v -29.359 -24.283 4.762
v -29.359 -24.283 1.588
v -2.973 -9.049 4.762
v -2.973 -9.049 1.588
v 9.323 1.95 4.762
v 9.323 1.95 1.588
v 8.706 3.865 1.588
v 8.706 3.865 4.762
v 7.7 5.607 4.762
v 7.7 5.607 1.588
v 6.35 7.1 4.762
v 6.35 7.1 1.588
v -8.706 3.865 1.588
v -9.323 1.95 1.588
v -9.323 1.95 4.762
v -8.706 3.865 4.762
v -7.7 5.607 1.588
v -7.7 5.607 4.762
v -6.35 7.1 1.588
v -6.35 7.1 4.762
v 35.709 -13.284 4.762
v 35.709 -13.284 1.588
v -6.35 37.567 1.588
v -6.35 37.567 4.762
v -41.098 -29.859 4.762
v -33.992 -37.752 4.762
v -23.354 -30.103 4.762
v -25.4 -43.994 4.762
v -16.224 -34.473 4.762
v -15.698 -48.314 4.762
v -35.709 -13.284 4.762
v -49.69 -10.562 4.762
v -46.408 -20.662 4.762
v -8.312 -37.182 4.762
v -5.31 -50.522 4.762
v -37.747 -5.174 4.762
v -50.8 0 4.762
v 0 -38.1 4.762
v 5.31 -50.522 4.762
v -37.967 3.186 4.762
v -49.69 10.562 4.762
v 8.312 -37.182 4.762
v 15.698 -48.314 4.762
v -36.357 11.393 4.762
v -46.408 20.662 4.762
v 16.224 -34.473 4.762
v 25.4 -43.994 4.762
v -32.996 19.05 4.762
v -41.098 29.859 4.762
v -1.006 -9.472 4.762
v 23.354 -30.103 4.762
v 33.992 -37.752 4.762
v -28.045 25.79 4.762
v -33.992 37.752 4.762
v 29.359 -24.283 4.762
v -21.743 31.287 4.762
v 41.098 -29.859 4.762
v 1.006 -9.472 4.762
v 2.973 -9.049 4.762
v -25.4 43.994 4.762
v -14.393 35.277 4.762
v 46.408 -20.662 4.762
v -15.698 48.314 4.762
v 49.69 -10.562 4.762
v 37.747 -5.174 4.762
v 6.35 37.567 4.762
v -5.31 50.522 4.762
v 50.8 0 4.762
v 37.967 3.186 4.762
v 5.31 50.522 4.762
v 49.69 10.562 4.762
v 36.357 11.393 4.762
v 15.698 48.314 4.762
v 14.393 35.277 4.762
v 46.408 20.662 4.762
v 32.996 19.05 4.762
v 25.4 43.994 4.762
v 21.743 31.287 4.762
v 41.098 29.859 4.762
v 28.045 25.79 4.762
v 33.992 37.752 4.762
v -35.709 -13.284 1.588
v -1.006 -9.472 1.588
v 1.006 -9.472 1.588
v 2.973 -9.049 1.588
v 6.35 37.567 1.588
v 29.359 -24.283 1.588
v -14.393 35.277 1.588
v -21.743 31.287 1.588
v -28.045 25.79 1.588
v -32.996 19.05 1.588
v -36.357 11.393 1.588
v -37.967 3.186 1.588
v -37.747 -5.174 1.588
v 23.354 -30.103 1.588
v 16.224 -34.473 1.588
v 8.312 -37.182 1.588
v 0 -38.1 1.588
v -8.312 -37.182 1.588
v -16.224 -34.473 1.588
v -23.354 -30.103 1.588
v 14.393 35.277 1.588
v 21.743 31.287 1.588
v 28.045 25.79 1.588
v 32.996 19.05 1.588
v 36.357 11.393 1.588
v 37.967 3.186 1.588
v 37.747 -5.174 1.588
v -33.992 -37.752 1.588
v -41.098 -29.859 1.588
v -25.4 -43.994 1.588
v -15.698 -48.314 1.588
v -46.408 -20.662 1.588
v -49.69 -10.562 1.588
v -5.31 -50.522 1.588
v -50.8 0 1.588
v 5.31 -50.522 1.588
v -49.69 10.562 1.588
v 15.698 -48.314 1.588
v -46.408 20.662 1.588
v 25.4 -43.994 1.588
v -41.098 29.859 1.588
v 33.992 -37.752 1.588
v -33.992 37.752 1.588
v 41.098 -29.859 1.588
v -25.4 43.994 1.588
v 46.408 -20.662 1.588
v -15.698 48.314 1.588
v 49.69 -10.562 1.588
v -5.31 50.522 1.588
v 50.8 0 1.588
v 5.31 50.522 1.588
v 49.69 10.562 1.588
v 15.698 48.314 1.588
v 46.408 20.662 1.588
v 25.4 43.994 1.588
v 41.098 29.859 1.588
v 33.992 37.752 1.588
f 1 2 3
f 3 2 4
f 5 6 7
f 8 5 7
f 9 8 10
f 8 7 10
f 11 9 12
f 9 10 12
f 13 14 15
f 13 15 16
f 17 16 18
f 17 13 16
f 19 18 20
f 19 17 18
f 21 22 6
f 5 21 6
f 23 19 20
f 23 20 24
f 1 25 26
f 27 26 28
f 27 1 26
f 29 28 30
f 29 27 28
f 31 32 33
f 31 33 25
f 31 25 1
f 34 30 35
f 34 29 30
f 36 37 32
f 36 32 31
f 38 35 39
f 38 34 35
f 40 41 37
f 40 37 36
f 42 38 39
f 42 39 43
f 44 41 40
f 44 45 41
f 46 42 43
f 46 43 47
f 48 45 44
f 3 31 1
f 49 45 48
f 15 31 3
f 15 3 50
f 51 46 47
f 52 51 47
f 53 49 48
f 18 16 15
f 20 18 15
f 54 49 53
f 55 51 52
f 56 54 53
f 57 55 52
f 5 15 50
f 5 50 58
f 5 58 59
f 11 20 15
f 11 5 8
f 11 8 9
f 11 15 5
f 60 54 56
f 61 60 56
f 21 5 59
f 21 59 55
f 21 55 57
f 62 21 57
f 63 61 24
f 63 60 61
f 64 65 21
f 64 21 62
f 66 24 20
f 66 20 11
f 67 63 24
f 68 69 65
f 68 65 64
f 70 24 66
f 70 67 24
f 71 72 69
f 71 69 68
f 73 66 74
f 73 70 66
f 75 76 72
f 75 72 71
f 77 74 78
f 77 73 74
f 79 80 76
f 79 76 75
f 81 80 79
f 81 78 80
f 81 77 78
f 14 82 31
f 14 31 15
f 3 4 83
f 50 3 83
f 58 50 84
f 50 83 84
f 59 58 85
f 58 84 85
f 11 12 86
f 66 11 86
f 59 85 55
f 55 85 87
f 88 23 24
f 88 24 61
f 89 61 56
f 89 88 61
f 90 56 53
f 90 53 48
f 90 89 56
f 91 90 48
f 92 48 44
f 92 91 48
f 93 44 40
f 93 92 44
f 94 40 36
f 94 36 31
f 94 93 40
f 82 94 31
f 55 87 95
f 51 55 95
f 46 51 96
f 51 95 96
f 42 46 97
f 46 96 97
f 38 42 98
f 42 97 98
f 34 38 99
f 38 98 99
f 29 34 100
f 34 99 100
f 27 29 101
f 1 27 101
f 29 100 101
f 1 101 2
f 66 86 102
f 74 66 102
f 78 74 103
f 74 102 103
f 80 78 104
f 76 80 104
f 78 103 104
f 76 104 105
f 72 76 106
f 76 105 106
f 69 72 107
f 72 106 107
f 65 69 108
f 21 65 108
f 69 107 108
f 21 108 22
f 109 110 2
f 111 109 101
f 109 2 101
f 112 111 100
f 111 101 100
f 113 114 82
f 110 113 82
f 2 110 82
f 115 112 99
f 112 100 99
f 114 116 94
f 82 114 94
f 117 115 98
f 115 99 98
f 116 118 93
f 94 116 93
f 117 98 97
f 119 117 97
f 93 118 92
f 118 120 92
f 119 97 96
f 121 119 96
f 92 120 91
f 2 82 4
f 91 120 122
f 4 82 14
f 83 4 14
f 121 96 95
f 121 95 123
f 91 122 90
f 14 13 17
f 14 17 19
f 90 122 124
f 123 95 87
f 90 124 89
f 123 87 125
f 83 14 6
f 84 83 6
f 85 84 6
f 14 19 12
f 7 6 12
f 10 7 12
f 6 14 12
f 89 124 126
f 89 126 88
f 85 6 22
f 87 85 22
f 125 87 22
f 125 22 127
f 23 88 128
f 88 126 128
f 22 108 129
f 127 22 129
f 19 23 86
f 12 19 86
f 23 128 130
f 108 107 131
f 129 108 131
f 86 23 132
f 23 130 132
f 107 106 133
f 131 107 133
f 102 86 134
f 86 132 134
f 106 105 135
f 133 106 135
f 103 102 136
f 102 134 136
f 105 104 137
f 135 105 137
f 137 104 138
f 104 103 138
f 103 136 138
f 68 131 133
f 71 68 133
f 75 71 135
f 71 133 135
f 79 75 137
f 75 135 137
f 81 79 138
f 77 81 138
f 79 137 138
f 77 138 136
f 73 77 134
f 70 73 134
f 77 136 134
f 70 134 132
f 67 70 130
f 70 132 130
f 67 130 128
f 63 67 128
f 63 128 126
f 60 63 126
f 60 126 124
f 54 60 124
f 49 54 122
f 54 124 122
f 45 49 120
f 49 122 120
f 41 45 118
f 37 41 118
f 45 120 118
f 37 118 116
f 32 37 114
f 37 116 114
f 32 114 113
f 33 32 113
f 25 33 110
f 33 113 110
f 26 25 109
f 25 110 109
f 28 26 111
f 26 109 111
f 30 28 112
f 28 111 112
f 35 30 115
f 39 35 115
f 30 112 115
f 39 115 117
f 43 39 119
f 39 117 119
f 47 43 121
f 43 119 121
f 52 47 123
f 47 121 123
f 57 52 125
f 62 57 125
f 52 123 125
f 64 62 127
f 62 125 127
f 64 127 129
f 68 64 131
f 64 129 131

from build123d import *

# Parameters (mm, degrees)
SKETCH1_R           = 101.6
BOSS_EXTRUDE1_DEPTH = 6.35
SCALE1_SCALE        = 0.5


with BuildPart() as part:
    # Sketch1 → Boss-Extrude1 (new body)
    with BuildSketch(Plane.XY):
        Circle(SKETCH1_R)
        with BuildLine():
            Line((-12.7, 14.199031657), (-12.7, 75.134213245))
            ThreePointArc((-12.7, 75.134213245), (-65.991135768, 38.1), (-71.418137364, -26.568583995))
            Line((-71.418137364, -26.568583995), (-18.646722124, 3.8990068))
            ThreePointArc((-18.646722124, 3.8990068), (-16.497783942, 9.525), (-12.7, 14.199031657))
        make_face(mode=Mode.SUBTRACT)
        with BuildLine():
            Line((12.7, 14.199031657), (12.7, 75.134213245))
            ThreePointArc((12.7, 75.134213245), (65.991135768, 38.1), (71.418137364, -26.568583995))
            Line((71.418137364, -26.568583995), (18.646722124, 3.8990068))
            ThreePointArc((18.646722124, 3.8990068), (16.497783942, 9.525), (12.7, 14.199031657))
        make_face(mode=Mode.SUBTRACT)
        with BuildLine():
            Line((5.946722124, -18.098038457), (58.718137364, -48.565629251))
            ThreePointArc((58.718137364, -48.565629251), (0, -76.2), (-58.718137364, -48.565629251))
            Line((-58.718137364, -48.565629251), (-5.946722124, -18.098038457))
            ThreePointArc((-5.946722124, -18.098038457), (0, -19.05), (5.946722124, -18.098038457))
        make_face(mode=Mode.SUBTRACT)
    extrude(amount=BOSS_EXTRUDE1_DEPTH)


with BuildPart() as part_1:
    # Scale1: scaled about (0, 0, 3.175)
    add(part.part.scale(SCALE1_SCALE).moved(Location((0, 0, 1.5875))))


solid = part_1.part
